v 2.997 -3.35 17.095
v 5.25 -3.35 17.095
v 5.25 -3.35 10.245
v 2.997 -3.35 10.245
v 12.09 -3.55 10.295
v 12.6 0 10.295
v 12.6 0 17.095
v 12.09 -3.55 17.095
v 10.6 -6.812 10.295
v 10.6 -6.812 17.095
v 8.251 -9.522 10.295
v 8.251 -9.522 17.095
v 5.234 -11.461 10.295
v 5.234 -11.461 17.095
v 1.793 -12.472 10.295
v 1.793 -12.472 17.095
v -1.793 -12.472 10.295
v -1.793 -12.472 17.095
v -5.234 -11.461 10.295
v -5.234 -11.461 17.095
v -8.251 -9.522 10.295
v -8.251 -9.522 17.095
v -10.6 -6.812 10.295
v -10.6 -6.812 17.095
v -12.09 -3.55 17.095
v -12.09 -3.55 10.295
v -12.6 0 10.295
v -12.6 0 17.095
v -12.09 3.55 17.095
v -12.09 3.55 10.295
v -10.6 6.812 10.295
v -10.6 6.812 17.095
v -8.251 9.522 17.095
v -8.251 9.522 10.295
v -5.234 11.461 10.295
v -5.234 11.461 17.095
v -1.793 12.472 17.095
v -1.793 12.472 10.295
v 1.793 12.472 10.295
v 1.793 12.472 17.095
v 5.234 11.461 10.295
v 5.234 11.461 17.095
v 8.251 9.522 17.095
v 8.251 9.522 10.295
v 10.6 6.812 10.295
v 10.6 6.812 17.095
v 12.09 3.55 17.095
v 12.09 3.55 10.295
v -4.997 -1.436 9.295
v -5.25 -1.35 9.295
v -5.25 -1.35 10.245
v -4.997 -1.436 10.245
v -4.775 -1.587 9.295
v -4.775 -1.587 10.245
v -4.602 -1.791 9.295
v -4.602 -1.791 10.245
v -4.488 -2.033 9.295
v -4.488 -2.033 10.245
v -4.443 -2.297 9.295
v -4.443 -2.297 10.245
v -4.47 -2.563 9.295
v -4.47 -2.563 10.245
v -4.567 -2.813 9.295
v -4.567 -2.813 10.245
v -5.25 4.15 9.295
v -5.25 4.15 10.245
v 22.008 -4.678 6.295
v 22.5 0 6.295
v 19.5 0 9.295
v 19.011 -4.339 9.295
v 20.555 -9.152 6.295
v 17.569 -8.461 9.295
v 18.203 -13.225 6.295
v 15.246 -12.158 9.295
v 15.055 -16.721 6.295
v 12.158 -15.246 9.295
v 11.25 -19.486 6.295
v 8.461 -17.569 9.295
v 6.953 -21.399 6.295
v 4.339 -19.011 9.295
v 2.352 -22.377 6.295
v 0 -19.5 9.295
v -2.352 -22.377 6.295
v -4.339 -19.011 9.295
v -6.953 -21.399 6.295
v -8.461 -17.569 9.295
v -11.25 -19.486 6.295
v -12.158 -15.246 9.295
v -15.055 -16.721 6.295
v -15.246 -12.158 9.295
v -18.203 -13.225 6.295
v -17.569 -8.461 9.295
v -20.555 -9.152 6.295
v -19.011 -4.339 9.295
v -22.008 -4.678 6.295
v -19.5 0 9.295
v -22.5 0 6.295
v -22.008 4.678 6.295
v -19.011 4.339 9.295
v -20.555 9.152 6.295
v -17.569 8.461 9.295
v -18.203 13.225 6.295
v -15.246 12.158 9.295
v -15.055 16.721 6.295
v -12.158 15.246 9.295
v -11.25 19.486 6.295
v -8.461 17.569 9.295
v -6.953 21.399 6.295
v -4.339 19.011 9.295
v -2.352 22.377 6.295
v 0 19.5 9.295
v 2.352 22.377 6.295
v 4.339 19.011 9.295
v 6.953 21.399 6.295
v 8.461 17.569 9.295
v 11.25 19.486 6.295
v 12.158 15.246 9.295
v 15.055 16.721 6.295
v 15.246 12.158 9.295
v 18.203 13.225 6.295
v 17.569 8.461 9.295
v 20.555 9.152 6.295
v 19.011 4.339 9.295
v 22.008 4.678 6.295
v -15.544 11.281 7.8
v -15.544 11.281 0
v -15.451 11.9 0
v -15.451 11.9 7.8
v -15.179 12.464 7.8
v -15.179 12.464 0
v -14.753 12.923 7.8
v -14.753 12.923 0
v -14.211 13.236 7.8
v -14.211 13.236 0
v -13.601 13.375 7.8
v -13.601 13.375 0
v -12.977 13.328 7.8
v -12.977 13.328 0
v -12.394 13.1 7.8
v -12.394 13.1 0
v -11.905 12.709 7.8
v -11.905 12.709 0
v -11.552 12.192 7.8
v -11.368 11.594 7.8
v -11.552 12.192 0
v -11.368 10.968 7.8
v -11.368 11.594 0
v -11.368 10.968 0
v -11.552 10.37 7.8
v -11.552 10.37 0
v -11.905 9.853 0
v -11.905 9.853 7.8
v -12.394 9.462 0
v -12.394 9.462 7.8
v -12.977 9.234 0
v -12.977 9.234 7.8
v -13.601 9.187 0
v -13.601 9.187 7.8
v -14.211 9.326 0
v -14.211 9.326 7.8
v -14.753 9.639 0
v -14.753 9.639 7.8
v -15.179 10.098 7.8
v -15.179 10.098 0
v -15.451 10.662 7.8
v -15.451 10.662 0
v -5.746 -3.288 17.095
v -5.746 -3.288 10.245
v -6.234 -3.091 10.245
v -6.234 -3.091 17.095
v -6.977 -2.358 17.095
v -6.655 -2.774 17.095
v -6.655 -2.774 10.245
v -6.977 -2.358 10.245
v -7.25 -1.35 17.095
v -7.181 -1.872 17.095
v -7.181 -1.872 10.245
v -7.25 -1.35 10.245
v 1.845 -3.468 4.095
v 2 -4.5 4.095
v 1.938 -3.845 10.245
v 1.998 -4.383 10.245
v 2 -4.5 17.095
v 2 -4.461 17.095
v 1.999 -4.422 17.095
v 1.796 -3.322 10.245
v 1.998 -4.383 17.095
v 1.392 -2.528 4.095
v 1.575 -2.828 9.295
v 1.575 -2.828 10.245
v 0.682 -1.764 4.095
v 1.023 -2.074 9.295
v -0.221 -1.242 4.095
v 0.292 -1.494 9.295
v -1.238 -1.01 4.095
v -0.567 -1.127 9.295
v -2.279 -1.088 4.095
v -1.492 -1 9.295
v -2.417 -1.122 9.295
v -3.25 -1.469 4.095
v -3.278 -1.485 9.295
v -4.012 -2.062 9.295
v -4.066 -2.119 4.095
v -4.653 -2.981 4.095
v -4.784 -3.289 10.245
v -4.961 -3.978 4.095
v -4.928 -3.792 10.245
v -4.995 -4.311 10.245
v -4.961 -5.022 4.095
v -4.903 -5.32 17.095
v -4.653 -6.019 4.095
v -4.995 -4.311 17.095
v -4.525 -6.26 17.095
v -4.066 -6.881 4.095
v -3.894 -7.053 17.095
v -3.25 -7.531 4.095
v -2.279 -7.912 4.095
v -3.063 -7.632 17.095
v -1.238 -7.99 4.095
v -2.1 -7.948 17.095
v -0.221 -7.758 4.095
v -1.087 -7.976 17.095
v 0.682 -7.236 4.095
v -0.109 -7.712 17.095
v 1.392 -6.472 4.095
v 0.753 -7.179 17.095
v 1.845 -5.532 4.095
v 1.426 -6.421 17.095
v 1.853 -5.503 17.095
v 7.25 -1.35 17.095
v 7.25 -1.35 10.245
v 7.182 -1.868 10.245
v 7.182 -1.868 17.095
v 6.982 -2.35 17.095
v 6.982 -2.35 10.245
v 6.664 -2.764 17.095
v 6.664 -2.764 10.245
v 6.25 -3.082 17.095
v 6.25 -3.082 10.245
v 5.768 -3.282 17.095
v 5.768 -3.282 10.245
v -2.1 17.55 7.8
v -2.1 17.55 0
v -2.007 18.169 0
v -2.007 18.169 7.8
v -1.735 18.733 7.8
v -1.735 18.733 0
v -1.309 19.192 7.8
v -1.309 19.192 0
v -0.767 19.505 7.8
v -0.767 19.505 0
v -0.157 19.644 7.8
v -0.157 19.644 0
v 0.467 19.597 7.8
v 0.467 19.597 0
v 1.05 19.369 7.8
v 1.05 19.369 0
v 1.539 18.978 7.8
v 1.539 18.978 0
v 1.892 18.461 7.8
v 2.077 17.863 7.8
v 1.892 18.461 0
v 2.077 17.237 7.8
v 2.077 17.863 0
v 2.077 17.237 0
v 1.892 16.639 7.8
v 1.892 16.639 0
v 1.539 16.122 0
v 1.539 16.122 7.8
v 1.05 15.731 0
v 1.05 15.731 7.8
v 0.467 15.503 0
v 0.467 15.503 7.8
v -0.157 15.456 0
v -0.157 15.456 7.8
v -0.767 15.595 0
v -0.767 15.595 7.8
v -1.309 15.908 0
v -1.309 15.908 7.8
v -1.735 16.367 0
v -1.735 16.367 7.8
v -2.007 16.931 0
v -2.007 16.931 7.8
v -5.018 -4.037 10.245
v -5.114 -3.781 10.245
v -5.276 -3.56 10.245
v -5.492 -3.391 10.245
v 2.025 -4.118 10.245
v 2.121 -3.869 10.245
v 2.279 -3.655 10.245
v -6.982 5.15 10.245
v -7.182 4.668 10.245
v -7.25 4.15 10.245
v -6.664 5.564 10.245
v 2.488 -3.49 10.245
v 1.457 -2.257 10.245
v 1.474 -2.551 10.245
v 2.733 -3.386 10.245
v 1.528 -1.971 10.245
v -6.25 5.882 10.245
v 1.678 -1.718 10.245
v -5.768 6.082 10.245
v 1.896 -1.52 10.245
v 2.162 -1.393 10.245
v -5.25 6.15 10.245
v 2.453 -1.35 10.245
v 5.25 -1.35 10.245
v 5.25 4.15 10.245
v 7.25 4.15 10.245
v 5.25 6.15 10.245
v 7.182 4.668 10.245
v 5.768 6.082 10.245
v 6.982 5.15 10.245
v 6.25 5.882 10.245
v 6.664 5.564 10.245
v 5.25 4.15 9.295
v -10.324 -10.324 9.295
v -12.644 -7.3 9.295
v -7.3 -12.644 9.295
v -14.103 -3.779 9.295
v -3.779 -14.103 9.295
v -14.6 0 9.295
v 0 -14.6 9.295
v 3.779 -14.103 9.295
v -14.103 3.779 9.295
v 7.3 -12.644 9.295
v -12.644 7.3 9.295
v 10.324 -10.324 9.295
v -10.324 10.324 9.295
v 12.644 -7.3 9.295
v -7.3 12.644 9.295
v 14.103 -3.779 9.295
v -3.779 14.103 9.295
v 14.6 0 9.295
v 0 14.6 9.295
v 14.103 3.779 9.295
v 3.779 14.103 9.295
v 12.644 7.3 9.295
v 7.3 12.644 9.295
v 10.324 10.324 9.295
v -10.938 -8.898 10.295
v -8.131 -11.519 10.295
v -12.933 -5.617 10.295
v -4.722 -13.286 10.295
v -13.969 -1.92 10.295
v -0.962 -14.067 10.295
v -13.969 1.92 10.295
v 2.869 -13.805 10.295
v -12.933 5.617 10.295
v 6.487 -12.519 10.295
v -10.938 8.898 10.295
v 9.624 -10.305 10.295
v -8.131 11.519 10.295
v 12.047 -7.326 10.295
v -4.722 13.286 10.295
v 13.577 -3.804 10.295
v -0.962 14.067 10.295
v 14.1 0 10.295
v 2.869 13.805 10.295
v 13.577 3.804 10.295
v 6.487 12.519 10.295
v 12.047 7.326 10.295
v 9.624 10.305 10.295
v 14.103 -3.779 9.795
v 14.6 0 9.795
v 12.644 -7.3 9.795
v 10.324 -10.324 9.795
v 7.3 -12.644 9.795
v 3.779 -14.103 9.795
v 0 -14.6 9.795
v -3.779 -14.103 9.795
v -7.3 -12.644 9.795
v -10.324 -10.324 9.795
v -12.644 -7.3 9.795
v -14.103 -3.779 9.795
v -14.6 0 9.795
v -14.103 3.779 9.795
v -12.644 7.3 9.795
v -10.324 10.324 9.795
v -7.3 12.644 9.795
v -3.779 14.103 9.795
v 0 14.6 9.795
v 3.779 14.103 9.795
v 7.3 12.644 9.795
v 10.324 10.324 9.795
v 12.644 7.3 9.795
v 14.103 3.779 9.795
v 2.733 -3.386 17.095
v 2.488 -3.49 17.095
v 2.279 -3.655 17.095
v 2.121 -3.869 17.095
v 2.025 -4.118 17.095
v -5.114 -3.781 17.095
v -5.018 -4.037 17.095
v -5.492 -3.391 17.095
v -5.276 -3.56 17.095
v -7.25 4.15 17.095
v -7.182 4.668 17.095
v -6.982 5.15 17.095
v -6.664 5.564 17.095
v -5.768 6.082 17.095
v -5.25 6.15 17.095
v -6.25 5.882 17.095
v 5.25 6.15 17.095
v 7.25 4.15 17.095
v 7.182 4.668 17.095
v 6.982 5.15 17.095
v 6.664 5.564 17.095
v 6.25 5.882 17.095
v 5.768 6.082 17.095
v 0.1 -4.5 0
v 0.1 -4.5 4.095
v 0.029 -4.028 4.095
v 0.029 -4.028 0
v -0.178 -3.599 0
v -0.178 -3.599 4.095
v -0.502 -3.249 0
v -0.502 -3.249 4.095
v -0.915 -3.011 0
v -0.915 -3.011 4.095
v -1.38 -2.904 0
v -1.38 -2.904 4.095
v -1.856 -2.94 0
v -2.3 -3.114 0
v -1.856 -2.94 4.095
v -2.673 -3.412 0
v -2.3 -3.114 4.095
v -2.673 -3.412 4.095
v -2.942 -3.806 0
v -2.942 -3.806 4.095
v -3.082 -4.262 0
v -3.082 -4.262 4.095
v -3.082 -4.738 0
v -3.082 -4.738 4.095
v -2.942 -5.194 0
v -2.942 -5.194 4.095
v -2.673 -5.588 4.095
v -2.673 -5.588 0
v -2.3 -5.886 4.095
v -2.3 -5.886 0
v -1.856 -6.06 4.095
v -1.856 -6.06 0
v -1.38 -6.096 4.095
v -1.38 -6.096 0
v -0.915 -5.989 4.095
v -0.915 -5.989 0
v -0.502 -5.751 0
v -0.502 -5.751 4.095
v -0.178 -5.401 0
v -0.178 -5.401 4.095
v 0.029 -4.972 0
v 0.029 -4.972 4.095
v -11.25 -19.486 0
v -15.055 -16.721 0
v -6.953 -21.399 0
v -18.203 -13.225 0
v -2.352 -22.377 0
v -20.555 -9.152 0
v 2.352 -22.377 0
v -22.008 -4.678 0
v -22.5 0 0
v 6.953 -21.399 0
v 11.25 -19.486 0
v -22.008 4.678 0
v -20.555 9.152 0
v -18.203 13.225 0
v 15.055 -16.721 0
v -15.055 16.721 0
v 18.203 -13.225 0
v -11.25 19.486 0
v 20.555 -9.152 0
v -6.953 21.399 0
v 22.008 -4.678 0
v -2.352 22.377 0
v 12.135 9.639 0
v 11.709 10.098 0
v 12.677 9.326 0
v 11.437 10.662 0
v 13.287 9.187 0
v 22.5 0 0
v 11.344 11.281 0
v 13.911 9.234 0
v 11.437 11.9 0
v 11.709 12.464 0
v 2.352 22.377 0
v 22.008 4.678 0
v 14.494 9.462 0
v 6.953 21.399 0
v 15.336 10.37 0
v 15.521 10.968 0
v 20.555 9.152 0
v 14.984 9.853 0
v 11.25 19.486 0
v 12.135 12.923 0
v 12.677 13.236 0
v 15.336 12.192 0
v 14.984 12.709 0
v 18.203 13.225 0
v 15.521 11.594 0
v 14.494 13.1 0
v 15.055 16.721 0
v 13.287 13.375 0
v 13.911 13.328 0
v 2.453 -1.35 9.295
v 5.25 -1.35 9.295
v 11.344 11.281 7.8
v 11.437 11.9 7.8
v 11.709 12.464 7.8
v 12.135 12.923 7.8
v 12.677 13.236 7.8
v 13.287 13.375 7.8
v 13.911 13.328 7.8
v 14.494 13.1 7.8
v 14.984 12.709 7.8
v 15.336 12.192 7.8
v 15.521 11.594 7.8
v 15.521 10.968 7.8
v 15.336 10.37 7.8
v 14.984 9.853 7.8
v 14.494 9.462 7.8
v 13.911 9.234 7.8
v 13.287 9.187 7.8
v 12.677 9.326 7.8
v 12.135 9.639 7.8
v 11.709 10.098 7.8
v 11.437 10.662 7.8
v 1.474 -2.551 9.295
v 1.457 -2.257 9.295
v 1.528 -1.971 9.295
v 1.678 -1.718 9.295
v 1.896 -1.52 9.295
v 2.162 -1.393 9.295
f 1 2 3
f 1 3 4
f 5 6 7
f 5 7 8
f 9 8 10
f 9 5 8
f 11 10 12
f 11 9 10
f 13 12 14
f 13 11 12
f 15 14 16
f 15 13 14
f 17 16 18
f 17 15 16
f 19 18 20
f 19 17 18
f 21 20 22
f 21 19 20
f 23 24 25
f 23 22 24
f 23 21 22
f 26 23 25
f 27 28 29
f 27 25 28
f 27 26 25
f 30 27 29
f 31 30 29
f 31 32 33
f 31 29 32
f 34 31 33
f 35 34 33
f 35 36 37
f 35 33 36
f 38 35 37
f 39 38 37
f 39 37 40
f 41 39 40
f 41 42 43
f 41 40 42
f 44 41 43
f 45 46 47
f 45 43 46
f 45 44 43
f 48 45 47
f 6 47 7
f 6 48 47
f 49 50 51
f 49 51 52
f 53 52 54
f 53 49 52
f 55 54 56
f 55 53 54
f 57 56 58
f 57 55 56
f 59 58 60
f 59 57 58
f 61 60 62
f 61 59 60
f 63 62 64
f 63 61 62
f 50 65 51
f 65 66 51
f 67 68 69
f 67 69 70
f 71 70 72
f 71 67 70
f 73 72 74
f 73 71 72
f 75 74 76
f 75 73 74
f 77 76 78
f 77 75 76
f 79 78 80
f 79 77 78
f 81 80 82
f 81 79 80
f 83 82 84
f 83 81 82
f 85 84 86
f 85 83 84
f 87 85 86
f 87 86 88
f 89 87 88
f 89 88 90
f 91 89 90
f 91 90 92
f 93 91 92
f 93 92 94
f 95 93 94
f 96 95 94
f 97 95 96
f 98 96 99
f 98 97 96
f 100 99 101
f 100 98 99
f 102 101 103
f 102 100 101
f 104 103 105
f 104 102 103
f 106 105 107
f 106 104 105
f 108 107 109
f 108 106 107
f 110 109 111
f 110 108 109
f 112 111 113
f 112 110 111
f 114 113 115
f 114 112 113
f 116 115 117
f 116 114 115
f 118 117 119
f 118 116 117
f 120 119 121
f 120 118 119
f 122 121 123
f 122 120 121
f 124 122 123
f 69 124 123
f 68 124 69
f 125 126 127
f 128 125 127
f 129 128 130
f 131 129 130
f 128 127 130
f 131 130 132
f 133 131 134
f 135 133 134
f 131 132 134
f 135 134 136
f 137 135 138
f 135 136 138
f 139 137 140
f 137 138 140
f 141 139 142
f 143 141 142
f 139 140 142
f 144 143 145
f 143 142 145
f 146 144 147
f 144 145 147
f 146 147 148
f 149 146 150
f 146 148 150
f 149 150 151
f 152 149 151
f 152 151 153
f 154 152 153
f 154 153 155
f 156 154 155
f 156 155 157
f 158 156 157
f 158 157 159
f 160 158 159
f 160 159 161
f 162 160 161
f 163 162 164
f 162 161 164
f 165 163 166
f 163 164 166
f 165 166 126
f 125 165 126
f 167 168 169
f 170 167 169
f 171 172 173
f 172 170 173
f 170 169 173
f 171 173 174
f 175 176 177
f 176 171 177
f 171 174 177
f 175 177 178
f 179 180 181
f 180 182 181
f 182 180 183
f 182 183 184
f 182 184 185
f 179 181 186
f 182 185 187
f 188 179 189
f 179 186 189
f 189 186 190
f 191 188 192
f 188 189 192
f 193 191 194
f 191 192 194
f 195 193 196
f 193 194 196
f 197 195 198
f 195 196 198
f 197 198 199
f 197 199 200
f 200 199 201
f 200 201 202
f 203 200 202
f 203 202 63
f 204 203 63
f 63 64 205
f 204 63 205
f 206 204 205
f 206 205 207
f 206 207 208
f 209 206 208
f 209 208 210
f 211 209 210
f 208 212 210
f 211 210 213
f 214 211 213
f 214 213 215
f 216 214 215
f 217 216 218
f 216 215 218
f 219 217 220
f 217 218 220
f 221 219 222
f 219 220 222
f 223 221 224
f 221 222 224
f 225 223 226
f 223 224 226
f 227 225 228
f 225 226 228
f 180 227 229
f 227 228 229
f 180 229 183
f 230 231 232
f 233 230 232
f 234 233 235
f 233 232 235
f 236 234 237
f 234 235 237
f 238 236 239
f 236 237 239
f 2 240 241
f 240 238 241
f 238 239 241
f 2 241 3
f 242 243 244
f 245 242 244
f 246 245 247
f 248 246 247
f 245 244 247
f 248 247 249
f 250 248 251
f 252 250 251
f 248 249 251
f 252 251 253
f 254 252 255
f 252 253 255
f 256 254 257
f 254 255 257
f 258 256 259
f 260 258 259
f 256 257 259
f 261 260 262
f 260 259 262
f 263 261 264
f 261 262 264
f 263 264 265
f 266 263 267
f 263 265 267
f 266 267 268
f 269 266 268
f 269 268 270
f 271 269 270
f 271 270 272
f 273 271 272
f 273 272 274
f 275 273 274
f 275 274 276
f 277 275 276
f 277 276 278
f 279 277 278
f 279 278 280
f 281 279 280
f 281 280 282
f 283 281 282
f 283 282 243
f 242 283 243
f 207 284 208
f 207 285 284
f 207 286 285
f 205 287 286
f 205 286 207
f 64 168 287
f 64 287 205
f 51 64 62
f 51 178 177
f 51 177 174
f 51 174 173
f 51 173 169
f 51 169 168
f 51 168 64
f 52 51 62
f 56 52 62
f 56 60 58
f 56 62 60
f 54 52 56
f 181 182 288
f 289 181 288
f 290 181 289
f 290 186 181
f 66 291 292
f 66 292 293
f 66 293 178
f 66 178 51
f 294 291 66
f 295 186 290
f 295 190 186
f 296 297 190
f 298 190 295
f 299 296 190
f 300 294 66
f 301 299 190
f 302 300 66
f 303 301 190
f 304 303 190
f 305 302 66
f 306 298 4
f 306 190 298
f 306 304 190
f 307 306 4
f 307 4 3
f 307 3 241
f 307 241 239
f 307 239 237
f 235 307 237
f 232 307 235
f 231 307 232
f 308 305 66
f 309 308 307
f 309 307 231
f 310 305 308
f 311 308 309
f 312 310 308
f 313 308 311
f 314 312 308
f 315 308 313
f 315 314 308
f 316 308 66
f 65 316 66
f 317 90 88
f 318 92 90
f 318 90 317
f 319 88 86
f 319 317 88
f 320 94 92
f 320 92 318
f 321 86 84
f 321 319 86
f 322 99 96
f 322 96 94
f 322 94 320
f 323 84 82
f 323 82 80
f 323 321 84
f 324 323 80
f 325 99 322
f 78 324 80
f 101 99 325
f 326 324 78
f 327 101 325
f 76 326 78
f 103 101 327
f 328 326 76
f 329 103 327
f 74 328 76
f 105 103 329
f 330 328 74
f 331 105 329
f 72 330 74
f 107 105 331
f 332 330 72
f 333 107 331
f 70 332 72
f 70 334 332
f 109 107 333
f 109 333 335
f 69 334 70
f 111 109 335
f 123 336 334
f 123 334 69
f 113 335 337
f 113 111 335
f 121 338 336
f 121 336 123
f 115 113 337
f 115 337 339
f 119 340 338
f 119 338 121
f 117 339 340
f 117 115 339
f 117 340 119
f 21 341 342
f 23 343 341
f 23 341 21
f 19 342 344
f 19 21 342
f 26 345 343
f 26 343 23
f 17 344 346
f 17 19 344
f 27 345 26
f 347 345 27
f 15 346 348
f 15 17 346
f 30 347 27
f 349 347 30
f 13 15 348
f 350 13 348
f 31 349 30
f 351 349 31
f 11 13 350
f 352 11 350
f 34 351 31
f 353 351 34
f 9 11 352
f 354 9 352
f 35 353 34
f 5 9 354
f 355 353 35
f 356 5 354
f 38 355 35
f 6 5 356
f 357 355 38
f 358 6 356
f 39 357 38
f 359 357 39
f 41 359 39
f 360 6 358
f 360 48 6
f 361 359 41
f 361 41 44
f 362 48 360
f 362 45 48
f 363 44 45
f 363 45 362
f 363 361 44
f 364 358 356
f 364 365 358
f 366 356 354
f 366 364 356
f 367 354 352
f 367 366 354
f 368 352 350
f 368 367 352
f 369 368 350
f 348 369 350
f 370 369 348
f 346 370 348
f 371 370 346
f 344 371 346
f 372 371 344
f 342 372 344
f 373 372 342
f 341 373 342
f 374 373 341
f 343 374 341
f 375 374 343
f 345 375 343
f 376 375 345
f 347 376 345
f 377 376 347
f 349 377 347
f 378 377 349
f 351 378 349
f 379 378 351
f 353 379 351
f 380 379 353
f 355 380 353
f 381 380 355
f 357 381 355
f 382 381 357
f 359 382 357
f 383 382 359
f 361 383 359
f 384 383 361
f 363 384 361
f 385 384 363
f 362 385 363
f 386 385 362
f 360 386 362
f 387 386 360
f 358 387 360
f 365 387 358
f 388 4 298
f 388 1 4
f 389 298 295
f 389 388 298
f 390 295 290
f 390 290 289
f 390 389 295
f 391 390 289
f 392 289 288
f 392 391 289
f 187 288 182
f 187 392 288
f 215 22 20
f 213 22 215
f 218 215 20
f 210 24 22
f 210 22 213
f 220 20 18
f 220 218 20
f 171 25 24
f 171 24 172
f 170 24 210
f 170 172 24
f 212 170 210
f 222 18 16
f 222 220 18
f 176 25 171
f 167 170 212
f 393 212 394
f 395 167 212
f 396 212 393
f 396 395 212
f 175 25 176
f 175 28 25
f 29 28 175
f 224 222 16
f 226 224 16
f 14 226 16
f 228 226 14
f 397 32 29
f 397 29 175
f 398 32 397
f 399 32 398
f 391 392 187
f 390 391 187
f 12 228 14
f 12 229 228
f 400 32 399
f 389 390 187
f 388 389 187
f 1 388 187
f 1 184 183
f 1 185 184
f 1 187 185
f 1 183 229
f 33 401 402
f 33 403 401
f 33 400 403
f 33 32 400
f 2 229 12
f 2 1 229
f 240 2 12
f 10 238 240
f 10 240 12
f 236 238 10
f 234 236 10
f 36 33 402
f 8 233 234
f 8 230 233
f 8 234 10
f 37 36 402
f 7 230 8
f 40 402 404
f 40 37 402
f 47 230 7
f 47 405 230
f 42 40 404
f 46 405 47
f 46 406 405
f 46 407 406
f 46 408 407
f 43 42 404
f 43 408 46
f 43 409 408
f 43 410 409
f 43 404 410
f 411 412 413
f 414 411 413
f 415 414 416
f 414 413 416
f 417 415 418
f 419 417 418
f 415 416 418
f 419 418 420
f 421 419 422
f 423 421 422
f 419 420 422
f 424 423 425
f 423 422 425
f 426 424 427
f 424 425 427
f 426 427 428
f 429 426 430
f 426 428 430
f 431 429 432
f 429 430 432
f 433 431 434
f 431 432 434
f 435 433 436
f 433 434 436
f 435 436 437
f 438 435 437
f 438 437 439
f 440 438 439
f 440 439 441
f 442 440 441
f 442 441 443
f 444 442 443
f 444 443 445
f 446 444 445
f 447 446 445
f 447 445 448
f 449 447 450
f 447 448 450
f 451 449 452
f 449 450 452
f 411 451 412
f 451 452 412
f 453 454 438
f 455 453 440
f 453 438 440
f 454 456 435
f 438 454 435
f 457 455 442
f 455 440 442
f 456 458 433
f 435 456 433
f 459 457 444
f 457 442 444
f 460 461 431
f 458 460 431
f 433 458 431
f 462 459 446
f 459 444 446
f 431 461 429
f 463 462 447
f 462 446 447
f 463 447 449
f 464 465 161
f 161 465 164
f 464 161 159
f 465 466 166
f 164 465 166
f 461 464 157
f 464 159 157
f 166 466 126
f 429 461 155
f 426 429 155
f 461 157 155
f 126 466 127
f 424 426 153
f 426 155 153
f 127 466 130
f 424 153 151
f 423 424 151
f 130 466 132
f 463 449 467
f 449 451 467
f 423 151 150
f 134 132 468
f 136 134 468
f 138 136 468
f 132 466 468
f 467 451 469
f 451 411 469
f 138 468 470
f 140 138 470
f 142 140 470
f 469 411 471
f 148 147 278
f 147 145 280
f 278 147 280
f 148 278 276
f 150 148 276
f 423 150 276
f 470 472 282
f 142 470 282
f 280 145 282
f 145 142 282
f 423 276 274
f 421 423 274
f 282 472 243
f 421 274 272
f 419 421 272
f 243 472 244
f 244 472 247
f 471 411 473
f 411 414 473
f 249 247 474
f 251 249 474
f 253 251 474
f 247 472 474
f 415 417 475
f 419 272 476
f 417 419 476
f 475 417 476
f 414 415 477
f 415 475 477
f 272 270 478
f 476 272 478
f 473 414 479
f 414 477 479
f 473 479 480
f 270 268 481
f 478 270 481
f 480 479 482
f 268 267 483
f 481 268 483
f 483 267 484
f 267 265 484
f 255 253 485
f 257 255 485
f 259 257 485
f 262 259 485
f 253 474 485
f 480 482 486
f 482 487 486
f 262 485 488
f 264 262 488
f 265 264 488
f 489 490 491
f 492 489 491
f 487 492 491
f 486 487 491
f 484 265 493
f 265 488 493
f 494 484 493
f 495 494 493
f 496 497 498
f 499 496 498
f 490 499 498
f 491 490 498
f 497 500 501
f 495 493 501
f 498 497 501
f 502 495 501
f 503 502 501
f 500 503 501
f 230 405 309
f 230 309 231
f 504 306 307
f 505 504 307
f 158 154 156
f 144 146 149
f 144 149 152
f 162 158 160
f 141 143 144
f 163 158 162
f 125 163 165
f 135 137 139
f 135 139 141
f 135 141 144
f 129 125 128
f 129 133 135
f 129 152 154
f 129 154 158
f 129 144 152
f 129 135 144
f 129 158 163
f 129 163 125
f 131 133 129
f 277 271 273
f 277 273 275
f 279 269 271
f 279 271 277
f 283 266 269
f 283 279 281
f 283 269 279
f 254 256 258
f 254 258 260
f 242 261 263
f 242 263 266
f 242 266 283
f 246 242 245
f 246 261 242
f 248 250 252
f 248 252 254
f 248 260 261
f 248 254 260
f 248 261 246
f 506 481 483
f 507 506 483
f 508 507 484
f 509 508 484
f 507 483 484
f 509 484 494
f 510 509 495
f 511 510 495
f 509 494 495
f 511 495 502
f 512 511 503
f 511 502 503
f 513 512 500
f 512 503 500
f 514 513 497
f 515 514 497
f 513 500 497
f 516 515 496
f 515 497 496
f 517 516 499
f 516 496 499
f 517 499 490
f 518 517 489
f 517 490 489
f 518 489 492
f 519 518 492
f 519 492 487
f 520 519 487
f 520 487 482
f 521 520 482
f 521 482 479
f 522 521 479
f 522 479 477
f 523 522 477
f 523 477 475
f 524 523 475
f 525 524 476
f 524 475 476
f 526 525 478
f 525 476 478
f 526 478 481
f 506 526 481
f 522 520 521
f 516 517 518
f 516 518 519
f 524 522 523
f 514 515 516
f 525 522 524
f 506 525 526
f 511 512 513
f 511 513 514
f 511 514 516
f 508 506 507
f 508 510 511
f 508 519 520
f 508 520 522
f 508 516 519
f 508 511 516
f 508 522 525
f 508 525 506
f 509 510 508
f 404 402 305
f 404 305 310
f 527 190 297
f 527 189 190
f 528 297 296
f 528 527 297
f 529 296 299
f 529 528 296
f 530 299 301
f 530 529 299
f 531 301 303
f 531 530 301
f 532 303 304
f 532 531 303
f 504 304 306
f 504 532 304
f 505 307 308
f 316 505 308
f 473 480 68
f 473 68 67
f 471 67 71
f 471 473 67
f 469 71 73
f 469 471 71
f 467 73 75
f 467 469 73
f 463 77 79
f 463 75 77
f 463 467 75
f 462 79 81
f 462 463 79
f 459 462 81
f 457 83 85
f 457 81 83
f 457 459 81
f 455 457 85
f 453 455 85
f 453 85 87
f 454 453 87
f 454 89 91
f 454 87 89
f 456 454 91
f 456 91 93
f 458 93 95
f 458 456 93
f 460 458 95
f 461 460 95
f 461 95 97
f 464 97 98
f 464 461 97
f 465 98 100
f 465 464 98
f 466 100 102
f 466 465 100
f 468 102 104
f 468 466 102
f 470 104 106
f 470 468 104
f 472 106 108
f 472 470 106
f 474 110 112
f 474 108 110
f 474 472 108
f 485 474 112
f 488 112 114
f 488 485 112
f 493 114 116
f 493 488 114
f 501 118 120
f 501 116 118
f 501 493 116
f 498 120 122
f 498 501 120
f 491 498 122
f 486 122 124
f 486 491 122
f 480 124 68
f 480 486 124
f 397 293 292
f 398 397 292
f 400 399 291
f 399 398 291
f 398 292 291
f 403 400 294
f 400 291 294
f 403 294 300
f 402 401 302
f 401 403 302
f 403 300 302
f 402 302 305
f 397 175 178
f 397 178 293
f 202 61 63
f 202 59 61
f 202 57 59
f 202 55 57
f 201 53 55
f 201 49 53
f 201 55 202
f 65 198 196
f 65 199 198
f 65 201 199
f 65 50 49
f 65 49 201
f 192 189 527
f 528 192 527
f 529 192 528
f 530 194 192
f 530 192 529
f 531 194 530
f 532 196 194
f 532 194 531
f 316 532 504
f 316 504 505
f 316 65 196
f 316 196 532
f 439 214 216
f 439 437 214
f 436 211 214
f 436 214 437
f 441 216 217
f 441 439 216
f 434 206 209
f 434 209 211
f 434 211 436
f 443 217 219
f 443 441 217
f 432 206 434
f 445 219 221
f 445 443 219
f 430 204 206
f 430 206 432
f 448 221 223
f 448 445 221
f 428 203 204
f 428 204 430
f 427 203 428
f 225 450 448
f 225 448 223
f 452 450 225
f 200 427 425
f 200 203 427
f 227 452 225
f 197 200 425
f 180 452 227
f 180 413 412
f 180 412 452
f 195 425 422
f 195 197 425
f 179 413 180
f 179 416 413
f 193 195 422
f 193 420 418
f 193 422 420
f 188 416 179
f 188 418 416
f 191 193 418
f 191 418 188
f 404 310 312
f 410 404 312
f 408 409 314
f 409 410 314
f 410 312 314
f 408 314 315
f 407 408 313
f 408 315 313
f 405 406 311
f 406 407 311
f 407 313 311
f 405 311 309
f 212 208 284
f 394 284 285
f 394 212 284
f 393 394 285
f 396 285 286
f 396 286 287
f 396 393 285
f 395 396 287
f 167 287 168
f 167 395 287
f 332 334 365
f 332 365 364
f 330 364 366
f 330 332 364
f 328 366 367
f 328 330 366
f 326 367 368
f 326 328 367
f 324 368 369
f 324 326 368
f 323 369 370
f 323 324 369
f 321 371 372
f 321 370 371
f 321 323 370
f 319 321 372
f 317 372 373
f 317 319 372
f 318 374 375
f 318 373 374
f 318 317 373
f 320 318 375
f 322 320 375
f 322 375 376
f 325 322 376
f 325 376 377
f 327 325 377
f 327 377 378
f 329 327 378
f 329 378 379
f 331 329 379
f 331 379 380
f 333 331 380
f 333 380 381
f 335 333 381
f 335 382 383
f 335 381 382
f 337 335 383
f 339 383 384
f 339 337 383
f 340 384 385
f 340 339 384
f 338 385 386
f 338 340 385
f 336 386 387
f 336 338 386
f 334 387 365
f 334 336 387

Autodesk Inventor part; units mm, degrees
ref_plane "YZ Plane" through (0, 0, 0) normal (1, 0, 0) x (0, 1, 0)
ref_plane "XZ Plane" through (0, 0, 0) normal (0, 1, 0) x (-1, 0, 0)
ref_plane "XY Plane" through (0, 0, 0) normal (0, 0, 1) x (1, 0, 0)
sketch "Эскиз1" plane through (0, 0, 0) normal (0, 0, 1) x (1, 0, 0)
  circle A0 centre (0, 0) radius 22.5
  dimension "d0" = 45
extrude "Выдавливание1" add sketch "Эскиз1" along normal blind 9.295
sketch "Эскиз2" plane through (0, 0, 9.295) normal (0, 0, 1) x (1, 0, 0)
  circle A0 centre (0, 0) radius 12.6
  dimension "d3" = 25.2
extrude "Выдавливание2" add sketch "Эскиз2" along normal blind 7.8
sketch "Эскиз3" plane through (0, 0, 9.295) normal (0, 0, 1) x (1, 0, 0)
  circle A0 centre (0, 0) radius 12.6 projected
  circle A1 centre (0, 0) radius 22.5 projected
  circle A2 centre (0, 0) radius 14.6
  dimension "d6" = 2
extrude "Выдавливание3" add sketch "Эскиз3" along normal blind 1 contours A2
chamfer "Фаска1" distance 0.5 angle 45 1 edges at (-14.6, 0, 10.295)
sketch "Эскиз4" plane through (0, 0, 17.095) normal (0, 0, 1) x (1, 0, 0)
  line L0 (0, 0) -> (0, -1.1)
  line L1 (5, -1.1) -> (-5, -1.1)
  line L2 (-5, -1.1) -> (-5, 3.9)
  line L3 (-5, 3.9) -> (5, 3.9)
  line L4 (5, 3.9) -> (5, -1.1)
  circle A0 centre (0, 0) radius 12.6 projected
  line L5 (-5.25, -1.35) -> (5.25, -1.35)
  line L6 (5.25, -1.35) -> (5.25, 4.15)
  line L7 (5.25, 4.15) -> (-5.25, 4.15)
  line L8 (-5.25, 4.15) -> (-5.25, -1.35)
  dimension "d45" = 1.1
  dimension "d46" = 10
  dimension "d47" = 5
  dimension "d48" = 0.25
extrude "Выдавливание4" cut sketch "Эскиз4" against normal blind 7.8 contours L1 L2 L3 L4 | L8 L7 L6 L5
sketch "Эскиз5" plane through (0, 0, 0) normal (0, 0, -1) x (-1, 0, 0)
  circle A0 centre (13.4441, 11.2809) radius 1.5 projected
  circle A1 centre (0, 17.55) radius 1.5 projected
  circle A2 centre (-13.4441, 11.2809) radius 1.5 projected
  circle A3 centre (13.4441, 11.2809) radius 2.1
  circle A4 centre (0, 17.55) radius 2.1
  circle A5 centre (-13.4441, 11.2809) radius 2.1
  point P0 (0, 0)
  dimension "d16" = 4.2
  dimension "d17" = 4.2
  dimension "d18" = 4.2
extrude "Выдавливание5" cut sketch "Эскиз5" against normal blind 7.8 contours A0 | A1 | A2 | A3 | A4 | A5
sketch "Эскиз6" plane through (0, 0, 17.095) normal (0, 0, 1) x (1, 0, 0)
  circle A0 centre (-1.5, -4.5) radius 1.5 projected
  circle A1 centre (-1.5, -4.5) radius 3.5
  point P0 (0, 0)
  dimension "d21" = 7
extrude "Выдавливание6" cut sketch "Эскиз6" against normal blind 13 contours A0 | A1
sketch "Эскиз7" plane through (-1.5, -4.5, 4.095) normal (0, 0, 1) x (1, 0, 0)
  circle A0 centre (0, 0) radius 3.5 projected
  circle A1 centre (0, 0) radius 1.6
  point P0 (1.5, 4.5)
  dimension "d24" = 3.2
extrude "Выдавливание7" cut sketch "Эскиз7" against normal blind 13 contours A1
chamfer "Фаска2" distance 3 angle 45 1 edges at (-22.5, 0, 9.295)
sketch "Эскиз10" plane through (0, 0, 17.095) normal (0, 0, 1) x (1, 0, 0)
  arc A0 (0.0256, -1.35) -> (-3.0256, -1.35) centre (-1.5, -4.5) ccw projected
  line L0 (5.25, -1.35) -> (0.0256, -1.35) projected
  line L1 (5.25, 4.15) -> (5.25, -1.35) projected
  line L2 (-5.25, 4.15) -> (5.25, 4.15) projected
  line L3 (-5.25, -1.35) -> (-5.25, 4.15) projected
  line L4 (-3.0256, -1.35) -> (-5.25, -1.35) projected
  circle A1 centre (0, 0) radius 12.6 projected
  arc A2 (-3.0256, -1.35) -> (0.0256, -1.35) centre (-1.5, -4.5) ccw projected
  line L5 (-3.0256, -1.35) -> (-5.25, -1.35) projected
  line L6 (-5.25, -1.35) -> (-5.25, 4.15) projected
  line L7 (-5.25, 4.15) -> (5.25, 4.15) projected
  line L8 (5.25, 4.15) -> (5.25, -1.35) projected
  line L9 (5.25, -1.35) -> (0.0256, -1.35) projected
  arc A3 (-0.5369, -3.35) -> (-2.4631, -3.35) centre (-1.5, -4.5) ccw
  line L10 (-2.4631, -3.35) -> (-7.25, -3.35)
  line L11 (-7.25, -3.35) -> (-7.25, 6.15)
  line L12 (-7.25, 6.15) -> (7.25, 6.15)
  line L13 (7.25, 6.15) -> (7.25, -3.35)
  line L14 (7.25, -3.35) -> (-0.5369, -3.35)
  point P0 (-4.8057, -3.35)
  point P1 (-3.0256, -1.35)
  point P2 (0.0256, -1.35)
  point P3 (1.8057, -3.35)
  dimension "d49" = 2
extrude "Выдавливание10" cut sketch "Эскиз10" against normal blind 6.85 contours L0 L1 L2 L3 L4 A2 L10 L11 L12 L13 L14
fillet "Сопряжение3" radius 2 4 edges at (7.25, -3.35, 13.67) (-7.25, -3.35, 13.67) (-7.25, 6.15, 13.67) (7.25, 6.15, 13.67)
fillet "Сопряжение4" radius 1 4 edges at (1.8057, -3.35, 13.67) (-4.8057, -3.35, 13.67) (0.0256, -1.35, 9.77) (-3.0256, -1.35, 9.77)
properties part number "wheel_fixator"
